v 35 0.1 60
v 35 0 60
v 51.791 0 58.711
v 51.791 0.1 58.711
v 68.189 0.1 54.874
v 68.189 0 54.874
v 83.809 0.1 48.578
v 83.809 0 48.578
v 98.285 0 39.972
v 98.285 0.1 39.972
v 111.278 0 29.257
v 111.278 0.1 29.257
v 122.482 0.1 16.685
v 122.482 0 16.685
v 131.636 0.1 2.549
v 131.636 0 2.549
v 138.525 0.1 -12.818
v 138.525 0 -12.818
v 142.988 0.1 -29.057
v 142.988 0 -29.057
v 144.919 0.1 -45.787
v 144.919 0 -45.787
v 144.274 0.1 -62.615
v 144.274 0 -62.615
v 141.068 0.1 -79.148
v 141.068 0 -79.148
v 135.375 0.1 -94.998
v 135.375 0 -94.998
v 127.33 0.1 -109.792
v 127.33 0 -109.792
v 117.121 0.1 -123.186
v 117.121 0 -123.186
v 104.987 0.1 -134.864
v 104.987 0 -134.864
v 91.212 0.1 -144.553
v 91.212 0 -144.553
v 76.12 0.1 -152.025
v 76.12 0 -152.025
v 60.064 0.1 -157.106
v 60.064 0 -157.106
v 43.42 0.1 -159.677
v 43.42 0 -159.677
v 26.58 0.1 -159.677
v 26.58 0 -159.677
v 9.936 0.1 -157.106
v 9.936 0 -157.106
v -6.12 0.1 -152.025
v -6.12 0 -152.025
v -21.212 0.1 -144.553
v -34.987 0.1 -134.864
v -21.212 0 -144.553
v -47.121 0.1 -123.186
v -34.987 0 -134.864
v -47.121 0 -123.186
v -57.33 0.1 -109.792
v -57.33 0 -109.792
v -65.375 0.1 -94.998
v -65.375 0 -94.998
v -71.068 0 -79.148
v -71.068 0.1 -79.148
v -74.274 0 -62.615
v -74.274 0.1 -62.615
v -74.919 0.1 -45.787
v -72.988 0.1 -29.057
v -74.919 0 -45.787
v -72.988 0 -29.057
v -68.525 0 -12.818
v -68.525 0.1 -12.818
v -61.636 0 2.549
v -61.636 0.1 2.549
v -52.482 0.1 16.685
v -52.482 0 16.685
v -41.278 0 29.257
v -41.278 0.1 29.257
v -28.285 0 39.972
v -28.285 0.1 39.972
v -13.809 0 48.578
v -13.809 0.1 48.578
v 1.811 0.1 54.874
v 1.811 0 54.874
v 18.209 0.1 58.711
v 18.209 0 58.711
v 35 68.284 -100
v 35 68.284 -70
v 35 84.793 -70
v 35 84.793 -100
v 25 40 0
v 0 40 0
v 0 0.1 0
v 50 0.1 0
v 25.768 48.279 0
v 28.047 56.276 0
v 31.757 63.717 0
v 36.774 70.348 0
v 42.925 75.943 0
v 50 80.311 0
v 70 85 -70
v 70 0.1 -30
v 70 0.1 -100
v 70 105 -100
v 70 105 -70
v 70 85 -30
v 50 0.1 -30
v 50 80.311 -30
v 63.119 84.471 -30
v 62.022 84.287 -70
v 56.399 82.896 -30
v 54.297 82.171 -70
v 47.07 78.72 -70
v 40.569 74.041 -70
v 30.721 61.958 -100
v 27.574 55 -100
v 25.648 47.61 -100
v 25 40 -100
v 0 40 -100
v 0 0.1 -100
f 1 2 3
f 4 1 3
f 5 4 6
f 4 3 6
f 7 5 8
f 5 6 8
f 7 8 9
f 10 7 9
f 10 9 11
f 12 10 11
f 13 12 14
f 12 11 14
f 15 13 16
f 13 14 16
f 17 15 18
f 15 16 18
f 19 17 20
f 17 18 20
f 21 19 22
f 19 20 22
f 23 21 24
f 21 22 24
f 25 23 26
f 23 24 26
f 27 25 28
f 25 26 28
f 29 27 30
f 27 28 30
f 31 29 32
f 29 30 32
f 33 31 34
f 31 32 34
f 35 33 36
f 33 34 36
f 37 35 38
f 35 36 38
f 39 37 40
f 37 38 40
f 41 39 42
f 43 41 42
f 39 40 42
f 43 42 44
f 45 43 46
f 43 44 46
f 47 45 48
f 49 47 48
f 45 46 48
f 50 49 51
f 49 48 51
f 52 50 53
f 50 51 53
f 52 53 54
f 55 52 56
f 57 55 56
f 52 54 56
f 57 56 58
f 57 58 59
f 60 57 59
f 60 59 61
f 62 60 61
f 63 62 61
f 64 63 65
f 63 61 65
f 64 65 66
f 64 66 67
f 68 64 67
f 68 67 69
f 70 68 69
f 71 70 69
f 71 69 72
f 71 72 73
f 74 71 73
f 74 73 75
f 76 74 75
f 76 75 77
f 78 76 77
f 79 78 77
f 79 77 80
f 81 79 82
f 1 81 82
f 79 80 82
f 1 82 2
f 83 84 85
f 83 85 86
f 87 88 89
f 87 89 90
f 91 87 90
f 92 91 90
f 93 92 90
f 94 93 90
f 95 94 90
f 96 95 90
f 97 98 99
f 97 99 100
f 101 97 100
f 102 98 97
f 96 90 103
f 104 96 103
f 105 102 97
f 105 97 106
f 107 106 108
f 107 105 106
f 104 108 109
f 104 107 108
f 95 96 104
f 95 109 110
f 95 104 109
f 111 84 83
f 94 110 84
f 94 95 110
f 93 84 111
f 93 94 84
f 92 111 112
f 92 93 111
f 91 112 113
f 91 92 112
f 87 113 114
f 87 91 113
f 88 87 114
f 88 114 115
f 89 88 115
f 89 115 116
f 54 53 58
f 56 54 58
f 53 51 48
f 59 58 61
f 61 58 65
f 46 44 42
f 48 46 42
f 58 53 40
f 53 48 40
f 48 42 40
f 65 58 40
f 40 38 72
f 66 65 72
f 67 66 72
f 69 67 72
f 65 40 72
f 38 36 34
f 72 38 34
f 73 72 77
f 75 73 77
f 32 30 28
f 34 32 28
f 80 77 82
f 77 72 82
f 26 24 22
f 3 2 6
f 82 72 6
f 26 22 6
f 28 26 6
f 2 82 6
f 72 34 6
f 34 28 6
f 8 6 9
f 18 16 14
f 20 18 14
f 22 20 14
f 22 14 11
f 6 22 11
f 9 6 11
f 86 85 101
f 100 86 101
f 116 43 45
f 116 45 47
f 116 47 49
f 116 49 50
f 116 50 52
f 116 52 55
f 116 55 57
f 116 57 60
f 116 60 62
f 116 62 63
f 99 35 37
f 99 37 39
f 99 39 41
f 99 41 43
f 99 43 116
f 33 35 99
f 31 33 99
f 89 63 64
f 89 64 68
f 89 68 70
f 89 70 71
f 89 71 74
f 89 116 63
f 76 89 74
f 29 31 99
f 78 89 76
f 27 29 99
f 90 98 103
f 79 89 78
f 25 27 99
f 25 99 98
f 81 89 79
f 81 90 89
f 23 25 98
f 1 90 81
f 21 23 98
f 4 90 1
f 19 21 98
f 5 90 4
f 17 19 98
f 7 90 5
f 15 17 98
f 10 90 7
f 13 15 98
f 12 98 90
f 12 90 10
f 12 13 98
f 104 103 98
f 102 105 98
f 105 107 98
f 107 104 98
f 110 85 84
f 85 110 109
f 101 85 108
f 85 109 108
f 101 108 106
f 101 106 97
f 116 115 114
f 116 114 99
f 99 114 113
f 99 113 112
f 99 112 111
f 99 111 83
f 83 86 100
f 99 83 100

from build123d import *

# Parameters (mm, degrees)
EXTRUDE1_DEPTH = 100
SKETCH2_W      = 35
SKETCH2_H      = 30
EXTRUDE2_DEPTH = 105
SKETCH3_W      = 20
SKETCH3_H      = 30
EXTRUDE3_DEPTH = 105
EXTRUDE4_DEPTH = 31
SKETCH5_R      = 110
EXTRUDE5_DEPTH = 0.1


with BuildPart() as part:
    # Sketch1 → Extrude1 (new body)
    with BuildSketch(Plane.XY):
        with BuildLine():
            Line((0, 0), (70, 0))
            Line((70, 0), (70, 85))
            ThreePointArc((70, 85), (38.180194847, 71.819805153), (25, 40))
            Line((25, 40), (0, 40))
            Line((0, 40), (0, 0))
        make_face()
    extrude(amount=-EXTRUDE1_DEPTH)

    # Sketch2 → Extrude2 (add)
    with BuildSketch(Plane(origin=(0, 0, 0), x_dir=(1, 0, 0), z_dir=(0, 1, 0))):
        with Locations((52.5, 85)):
            Rectangle(SKETCH2_W, SKETCH2_H)
    extrude(amount=EXTRUDE2_DEPTH)

    # Sketch3 → Extrude3 (cut)
    with BuildSketch(Plane(origin=(0, 0, 0), x_dir=(1, 0, 0), z_dir=(0, 1, 0))):
        with Locations((60, 15)):
            Rectangle(SKETCH3_W, SKETCH3_H)
    extrude(amount=EXTRUDE3_DEPTH, mode=Mode.SUBTRACT)

    # Sketch4 → Extrude4 (cut, through all)
    with BuildSketch(Plane.XY.offset(-70)):
        Polygon((70, 105), (35, 105), (35, 84.792740578), align=None)
    extrude(amount=-EXTRUDE4_DEPTH, mode=Mode.SUBTRACT)

    # Sketch5 → Extrude5 (add)
    with BuildSketch(Plane(origin=(0, 0, 0), x_dir=(1, 0, 0), z_dir=(0, 1, 0))):
        with Locations(Location((35, 50, 0), (0, 0, 270))):  # turned: the seam where the file's is
            Circle(SKETCH5_R)
    extrude(amount=EXTRUDE5_DEPTH)


solid = part.part
